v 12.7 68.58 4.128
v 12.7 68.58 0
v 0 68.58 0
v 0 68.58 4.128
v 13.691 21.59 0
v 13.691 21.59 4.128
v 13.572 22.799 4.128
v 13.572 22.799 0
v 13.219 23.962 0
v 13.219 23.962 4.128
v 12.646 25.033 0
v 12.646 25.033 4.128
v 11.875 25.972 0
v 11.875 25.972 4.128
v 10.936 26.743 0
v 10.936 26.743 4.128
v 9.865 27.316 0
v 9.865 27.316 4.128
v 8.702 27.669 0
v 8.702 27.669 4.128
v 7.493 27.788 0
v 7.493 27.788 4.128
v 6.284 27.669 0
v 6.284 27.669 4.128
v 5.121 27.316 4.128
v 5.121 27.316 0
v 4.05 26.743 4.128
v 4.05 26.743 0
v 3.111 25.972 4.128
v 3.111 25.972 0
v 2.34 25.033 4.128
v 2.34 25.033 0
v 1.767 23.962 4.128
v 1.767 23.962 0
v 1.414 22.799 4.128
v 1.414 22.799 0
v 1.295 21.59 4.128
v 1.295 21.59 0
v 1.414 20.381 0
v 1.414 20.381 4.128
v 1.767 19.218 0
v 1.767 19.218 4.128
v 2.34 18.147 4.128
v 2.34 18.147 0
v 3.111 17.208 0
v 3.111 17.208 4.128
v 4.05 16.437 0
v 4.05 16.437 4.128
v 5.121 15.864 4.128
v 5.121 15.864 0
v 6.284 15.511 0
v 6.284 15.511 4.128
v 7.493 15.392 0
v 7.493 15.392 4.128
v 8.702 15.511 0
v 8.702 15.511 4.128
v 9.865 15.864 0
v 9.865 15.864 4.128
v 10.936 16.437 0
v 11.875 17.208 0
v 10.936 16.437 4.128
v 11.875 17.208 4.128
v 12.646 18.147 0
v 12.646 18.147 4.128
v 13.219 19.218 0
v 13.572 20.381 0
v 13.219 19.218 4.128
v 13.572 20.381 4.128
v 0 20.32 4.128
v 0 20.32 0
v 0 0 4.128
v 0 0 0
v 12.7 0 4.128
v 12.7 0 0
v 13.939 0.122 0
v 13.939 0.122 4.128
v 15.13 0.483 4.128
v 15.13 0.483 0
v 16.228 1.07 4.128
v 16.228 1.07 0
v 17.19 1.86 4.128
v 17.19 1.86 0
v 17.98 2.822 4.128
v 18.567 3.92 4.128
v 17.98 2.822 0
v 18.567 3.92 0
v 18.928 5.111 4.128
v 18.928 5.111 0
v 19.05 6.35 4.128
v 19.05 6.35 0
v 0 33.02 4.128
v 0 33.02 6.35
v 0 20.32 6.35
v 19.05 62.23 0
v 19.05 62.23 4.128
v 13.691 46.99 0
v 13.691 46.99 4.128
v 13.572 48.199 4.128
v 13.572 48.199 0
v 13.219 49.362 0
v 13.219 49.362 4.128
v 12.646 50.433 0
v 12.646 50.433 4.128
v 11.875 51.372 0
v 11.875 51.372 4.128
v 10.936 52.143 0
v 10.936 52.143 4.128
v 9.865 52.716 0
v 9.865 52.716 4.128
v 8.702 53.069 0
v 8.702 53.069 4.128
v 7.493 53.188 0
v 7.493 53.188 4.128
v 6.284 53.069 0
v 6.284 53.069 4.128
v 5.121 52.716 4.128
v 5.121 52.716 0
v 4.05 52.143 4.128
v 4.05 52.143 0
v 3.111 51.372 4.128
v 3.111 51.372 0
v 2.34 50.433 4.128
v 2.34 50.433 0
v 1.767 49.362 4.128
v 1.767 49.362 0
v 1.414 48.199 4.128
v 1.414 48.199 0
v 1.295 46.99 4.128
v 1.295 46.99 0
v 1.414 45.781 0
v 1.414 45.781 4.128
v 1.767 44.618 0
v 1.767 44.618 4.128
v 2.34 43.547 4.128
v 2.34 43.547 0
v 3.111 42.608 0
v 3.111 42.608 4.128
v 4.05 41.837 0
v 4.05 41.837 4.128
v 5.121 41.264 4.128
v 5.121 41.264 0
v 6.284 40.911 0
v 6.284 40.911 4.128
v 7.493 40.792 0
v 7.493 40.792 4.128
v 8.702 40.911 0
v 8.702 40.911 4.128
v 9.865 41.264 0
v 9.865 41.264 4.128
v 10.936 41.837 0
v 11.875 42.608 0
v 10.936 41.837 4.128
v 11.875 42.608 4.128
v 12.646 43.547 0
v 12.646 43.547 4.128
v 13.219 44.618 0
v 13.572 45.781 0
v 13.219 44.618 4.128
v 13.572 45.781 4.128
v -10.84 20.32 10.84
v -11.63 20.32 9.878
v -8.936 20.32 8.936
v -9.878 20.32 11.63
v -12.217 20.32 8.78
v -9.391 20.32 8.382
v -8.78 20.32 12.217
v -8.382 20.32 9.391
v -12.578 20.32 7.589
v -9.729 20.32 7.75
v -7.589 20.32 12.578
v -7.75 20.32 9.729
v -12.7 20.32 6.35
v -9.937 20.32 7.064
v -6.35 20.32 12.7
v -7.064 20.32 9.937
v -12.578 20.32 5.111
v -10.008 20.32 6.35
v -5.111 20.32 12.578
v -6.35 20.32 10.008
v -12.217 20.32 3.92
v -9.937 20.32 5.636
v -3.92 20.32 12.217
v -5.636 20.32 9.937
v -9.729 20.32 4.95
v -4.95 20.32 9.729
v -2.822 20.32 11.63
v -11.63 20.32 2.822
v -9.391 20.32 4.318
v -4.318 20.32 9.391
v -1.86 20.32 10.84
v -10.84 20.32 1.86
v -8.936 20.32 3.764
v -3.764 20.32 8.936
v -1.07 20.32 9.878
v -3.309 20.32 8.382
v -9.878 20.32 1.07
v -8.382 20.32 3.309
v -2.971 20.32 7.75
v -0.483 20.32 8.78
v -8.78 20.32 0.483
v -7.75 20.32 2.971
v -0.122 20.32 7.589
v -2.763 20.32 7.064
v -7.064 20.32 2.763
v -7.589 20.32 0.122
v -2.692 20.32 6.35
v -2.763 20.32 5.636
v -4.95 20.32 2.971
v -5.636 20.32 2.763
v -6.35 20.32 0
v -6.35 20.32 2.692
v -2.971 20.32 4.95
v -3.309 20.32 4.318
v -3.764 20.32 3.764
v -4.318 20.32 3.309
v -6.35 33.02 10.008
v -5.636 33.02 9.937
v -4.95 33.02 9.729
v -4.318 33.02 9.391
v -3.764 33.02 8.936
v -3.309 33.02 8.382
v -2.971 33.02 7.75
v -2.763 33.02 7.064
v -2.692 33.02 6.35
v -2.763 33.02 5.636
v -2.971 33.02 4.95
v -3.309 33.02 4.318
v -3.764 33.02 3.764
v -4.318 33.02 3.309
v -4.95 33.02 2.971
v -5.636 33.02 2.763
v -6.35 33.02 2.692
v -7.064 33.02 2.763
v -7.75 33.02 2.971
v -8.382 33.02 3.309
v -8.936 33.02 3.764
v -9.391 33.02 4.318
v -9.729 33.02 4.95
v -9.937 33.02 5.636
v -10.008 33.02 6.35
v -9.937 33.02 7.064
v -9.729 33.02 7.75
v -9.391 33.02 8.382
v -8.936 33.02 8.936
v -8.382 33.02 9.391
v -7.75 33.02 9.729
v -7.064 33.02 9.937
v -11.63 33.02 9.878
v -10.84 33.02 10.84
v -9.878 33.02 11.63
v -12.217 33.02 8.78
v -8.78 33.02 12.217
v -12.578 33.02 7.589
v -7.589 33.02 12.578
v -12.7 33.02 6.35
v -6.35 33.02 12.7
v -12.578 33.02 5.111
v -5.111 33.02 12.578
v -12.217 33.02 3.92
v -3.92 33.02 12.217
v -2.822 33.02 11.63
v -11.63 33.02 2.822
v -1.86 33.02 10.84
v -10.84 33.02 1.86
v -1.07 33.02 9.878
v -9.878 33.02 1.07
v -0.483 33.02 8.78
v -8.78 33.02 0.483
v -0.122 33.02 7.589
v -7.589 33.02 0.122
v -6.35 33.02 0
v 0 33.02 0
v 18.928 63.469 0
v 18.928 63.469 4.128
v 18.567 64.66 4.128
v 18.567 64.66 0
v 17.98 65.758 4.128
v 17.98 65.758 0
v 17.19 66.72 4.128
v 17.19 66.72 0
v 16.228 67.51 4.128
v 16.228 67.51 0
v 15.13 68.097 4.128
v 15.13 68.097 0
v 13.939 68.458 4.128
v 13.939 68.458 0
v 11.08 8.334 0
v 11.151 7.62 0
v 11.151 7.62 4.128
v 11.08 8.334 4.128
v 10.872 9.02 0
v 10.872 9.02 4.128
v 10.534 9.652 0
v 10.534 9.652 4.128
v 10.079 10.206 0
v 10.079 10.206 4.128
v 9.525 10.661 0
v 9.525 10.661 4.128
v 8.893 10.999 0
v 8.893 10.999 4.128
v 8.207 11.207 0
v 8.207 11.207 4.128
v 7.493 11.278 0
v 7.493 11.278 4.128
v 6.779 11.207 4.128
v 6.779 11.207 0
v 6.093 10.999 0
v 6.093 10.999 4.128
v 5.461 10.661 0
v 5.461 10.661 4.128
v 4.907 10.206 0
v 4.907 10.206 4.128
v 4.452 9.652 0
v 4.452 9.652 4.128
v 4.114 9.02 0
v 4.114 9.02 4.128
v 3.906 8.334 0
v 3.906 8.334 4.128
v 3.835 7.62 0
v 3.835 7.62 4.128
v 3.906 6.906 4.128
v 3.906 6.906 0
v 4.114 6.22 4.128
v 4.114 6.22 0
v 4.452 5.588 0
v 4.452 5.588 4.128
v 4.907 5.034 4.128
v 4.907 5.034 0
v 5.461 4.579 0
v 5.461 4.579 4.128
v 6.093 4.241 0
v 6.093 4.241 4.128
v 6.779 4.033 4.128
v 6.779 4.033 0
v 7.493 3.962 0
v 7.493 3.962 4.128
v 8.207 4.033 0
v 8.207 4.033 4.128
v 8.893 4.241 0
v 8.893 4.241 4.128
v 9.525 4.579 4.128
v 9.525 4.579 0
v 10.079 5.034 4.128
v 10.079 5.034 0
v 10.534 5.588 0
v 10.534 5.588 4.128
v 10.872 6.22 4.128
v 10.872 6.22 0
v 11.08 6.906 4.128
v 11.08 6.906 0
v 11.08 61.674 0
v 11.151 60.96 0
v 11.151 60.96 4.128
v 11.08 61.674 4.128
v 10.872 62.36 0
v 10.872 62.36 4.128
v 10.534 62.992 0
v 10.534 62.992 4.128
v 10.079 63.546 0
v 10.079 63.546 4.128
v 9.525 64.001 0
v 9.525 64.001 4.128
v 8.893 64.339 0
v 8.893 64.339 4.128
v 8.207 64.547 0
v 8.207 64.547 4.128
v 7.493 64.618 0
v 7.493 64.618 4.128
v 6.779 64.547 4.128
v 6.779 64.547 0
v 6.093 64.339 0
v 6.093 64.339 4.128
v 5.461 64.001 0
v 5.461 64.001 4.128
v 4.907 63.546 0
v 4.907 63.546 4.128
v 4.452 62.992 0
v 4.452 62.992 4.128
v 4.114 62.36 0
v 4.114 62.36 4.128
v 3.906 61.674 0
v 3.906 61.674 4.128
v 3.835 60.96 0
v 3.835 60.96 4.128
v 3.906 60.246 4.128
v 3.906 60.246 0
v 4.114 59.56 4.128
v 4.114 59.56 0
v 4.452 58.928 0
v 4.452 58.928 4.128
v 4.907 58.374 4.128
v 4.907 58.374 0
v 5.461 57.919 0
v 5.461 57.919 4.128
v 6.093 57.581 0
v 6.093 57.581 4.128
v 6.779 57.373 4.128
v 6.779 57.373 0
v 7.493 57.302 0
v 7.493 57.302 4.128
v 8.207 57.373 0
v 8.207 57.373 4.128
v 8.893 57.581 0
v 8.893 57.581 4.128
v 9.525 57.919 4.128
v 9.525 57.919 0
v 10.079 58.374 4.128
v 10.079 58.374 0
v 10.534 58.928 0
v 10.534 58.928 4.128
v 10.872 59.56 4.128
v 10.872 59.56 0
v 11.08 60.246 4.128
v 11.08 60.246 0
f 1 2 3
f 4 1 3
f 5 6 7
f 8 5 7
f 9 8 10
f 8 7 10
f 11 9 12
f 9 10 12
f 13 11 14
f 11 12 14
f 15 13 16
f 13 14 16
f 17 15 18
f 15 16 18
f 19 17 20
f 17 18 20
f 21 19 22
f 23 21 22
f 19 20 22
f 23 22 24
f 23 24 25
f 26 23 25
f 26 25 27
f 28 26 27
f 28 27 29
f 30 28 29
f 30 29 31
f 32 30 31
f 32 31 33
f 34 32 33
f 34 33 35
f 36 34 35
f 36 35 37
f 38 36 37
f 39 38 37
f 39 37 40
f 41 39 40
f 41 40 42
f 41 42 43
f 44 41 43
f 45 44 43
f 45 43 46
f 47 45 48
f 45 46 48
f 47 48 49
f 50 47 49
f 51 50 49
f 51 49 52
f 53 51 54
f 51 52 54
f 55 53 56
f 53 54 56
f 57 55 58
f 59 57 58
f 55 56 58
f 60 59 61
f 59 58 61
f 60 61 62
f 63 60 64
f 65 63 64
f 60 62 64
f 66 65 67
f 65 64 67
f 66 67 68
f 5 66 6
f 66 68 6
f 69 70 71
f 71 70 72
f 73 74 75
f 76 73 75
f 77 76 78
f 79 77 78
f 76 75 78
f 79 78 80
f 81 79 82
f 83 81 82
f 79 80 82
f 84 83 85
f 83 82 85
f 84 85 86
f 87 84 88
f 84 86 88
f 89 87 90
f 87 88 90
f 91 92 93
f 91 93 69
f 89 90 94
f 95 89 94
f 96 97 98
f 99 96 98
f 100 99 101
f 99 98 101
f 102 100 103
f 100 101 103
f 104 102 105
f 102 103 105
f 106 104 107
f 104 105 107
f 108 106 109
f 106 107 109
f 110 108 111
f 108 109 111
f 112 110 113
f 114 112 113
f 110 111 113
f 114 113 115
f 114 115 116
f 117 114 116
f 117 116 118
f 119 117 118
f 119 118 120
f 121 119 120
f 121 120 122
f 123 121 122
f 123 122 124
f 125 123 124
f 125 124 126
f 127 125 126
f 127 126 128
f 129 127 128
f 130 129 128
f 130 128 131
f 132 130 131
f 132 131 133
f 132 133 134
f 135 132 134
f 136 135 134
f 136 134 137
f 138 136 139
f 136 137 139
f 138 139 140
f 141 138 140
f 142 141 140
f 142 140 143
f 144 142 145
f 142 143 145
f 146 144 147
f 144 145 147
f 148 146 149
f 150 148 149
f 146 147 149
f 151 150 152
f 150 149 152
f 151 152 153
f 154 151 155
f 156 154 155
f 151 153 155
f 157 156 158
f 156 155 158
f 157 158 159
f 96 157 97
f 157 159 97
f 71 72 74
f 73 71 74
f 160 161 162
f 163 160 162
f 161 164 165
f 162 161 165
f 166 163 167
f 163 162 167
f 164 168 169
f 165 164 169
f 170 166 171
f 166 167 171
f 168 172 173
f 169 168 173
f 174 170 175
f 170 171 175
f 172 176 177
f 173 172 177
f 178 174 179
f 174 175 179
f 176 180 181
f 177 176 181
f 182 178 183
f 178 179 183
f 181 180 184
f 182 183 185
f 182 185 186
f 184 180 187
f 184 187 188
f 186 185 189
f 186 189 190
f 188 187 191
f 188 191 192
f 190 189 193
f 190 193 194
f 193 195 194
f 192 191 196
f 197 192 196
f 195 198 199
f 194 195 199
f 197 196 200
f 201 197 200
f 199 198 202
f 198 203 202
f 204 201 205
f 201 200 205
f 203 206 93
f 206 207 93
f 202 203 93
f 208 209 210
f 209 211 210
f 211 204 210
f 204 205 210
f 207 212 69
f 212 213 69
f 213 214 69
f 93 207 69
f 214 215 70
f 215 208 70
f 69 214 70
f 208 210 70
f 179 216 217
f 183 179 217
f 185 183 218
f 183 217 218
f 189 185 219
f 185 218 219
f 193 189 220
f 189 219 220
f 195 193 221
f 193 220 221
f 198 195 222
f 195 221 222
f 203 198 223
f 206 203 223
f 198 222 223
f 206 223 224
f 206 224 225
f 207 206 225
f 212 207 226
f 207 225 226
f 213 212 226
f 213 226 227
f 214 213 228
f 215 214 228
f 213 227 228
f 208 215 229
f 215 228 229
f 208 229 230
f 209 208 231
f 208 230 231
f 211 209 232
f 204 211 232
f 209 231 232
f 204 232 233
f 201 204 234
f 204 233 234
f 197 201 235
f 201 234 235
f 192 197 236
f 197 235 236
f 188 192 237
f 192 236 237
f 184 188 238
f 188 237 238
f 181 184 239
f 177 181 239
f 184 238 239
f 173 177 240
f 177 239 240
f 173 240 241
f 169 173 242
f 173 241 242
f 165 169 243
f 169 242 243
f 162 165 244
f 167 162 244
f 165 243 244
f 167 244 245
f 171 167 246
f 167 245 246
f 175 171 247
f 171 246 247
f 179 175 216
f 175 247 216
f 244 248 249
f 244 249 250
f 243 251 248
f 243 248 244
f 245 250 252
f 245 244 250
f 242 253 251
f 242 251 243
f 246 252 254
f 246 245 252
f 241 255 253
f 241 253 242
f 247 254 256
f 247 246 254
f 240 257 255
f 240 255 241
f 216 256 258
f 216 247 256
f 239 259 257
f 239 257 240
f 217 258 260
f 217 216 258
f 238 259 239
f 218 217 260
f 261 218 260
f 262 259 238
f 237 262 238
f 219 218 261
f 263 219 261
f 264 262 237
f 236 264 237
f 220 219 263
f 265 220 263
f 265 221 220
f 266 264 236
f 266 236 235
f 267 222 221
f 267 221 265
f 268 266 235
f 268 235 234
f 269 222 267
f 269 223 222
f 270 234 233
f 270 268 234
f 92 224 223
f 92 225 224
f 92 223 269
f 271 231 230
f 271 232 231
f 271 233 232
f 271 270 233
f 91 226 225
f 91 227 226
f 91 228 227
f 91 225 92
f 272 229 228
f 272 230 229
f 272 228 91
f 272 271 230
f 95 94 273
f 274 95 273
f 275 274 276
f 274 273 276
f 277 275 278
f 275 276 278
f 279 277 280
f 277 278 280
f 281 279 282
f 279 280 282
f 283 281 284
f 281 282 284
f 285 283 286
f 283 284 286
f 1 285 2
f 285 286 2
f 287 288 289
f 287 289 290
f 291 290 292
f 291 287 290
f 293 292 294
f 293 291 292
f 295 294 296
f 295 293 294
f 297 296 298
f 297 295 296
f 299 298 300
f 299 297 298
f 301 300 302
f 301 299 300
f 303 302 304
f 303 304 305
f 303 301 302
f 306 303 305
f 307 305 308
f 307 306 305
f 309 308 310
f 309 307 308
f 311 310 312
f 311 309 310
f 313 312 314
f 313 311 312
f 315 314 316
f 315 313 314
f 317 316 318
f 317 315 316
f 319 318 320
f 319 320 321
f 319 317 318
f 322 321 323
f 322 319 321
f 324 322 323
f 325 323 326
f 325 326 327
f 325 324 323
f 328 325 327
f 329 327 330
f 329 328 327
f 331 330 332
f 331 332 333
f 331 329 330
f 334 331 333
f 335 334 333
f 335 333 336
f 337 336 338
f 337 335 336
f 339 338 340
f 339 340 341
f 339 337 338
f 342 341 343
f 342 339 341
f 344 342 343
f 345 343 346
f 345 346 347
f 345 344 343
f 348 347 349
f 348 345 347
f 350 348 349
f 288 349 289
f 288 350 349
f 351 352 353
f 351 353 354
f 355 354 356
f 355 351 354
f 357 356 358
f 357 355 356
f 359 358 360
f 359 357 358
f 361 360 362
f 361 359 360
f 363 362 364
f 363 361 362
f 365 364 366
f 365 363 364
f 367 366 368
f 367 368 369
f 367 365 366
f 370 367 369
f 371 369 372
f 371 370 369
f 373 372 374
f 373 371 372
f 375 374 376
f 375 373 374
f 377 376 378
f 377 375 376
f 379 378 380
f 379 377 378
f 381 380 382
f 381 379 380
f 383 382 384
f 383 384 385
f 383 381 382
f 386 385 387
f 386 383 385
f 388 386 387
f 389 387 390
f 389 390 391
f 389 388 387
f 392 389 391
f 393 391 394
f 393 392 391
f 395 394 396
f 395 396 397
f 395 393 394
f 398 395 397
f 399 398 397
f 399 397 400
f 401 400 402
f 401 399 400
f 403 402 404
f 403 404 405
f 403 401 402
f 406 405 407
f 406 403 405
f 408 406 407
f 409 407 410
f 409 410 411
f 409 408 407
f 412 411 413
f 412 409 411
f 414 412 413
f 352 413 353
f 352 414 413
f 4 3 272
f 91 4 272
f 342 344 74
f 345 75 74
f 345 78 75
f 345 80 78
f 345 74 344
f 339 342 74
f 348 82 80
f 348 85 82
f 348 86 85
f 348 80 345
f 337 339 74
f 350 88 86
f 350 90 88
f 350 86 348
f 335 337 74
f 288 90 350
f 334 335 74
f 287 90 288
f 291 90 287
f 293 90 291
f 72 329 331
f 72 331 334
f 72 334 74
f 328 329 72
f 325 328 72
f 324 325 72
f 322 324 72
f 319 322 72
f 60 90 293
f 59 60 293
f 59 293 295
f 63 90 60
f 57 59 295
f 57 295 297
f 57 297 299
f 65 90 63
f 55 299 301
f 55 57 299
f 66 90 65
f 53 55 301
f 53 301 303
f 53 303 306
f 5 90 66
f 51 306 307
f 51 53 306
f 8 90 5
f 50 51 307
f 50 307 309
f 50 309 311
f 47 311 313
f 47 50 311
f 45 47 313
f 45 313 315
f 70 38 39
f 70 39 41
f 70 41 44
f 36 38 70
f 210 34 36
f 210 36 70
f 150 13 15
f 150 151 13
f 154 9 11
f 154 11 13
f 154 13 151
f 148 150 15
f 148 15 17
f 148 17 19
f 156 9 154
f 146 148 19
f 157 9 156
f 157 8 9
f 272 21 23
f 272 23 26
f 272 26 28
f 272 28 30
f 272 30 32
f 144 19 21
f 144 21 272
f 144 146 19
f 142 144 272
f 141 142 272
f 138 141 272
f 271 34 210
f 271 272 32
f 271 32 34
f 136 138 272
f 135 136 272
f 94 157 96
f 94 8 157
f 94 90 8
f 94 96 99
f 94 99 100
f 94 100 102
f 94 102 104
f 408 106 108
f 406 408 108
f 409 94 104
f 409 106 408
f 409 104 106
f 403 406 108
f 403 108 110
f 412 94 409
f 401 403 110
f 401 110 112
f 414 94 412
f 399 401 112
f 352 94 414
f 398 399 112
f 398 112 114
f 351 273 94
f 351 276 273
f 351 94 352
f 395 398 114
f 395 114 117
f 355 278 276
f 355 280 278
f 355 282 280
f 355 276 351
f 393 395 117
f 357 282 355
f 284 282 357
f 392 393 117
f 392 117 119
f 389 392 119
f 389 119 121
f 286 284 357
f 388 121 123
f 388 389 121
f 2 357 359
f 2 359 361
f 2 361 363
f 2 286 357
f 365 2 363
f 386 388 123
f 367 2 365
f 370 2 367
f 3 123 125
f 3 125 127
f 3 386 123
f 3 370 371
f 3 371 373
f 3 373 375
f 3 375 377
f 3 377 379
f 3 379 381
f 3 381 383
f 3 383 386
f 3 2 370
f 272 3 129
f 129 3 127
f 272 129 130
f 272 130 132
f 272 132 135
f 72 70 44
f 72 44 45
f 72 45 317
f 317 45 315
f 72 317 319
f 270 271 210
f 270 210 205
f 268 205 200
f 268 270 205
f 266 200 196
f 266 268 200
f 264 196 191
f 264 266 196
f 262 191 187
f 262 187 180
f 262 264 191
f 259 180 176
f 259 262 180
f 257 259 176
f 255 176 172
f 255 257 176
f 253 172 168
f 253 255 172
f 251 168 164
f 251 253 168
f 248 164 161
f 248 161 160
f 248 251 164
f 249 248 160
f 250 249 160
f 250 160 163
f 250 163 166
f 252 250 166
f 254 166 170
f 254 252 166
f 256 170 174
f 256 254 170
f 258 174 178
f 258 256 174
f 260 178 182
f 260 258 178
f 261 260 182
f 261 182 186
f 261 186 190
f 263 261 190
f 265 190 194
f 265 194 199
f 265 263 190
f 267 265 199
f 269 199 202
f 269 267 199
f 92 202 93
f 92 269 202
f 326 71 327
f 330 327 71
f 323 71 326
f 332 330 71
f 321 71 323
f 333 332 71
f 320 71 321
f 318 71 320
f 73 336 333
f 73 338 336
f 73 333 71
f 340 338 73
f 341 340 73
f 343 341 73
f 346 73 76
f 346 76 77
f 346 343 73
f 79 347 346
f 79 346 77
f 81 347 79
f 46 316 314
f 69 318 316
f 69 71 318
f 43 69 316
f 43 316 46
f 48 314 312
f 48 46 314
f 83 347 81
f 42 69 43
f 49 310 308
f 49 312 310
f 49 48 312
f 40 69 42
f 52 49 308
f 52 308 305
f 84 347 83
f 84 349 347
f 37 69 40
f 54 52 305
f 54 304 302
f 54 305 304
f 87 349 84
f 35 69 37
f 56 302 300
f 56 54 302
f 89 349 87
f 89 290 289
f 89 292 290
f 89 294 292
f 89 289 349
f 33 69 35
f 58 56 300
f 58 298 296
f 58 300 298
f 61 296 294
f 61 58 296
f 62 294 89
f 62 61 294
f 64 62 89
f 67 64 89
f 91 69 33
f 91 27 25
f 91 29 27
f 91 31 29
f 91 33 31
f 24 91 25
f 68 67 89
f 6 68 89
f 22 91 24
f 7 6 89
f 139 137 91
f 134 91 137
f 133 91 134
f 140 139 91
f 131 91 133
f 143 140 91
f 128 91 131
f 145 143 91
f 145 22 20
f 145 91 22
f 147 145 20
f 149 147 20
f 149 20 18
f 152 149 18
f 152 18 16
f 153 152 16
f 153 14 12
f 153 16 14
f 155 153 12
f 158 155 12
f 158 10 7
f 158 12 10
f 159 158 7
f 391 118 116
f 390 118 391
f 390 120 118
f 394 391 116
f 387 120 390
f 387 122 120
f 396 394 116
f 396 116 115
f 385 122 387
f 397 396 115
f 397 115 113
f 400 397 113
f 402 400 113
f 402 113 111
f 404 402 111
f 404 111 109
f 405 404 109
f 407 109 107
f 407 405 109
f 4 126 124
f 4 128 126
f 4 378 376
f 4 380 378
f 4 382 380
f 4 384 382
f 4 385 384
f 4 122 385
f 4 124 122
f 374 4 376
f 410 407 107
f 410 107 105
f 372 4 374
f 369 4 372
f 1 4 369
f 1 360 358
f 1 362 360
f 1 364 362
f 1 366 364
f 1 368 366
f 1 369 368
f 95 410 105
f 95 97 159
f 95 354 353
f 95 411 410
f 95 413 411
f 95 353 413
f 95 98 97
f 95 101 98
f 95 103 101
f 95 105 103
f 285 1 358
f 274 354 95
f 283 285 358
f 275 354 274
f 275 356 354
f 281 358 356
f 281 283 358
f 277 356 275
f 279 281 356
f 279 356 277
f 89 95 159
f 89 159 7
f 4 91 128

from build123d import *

# Parameters (mm, degrees)
SKETCH1_R           = 3.6576
BOSS_EXTRUDE1_DEPTH = 4.1275
BOSS_EXTRUDE2_START = -35.56
SKETCH2_R           = 3.6576
BOSS_EXTRUDE2_DEPTH = 12.7
SKETCH3_R           = 6.1976
CUT_EXTRUDE1_DEPTH  = 72.691050043


with BuildPart() as part:
    # Sketch1 → Boss-Extrude1 (new body)
    with BuildSketch(Plane.XY):
        with BuildLine():
            Line((0, 0), (12.7, 0))
            ThreePointArc((12.7, 0), (17.190128061, 1.859871939), (19.05, 6.35))
            Line((19.05, 6.35), (19.05, 62.23))
            ThreePointArc((19.05, 62.23), (17.190128061, 66.720128061), (12.7, 68.58))
            Line((12.7, 68.58), (0, 68.58))
            Line((0, 68.58), (0, 0))
        make_face()
        with Locations((7.493, 60.96)):
            Circle(SKETCH1_R, mode=Mode.SUBTRACT)
        with Locations((7.493, 7.62)):
            Circle(SKETCH1_R, mode=Mode.SUBTRACT)
    extrude(amount=BOSS_EXTRUDE1_DEPTH)

    # Sketch2 → Boss-Extrude2 (add)
    with BuildSketch(Plane(origin=(0, 68.58, 0), x_dir=(1, 0, 0), z_dir=(0, 1, 0)).offset(BOSS_EXTRUDE2_START)):
        with BuildLine():
            Line((0, 0), (-6.35, 0))
            ThreePointArc((-6.35, 0), (-10.840128061, -10.840128061), (0, -6.35))
            Line((0, -6.35), (0, -4.1275))
            Line((0, -4.1275), (0, 0))
        make_face()
        with Locations(Location((-6.35, -6.35, 0), (0, 0, 270))):
            Circle(SKETCH2_R, mode=Mode.SUBTRACT)
    extrude(amount=-BOSS_EXTRUDE2_DEPTH)

    # Sketch3 → Cut-Extrude1 (cut, through all)
    with BuildSketch(Plane.XY.offset(4.1275)):
        with Locations((7.493, 46.99)):
            Circle(SKETCH3_R)
        with Locations((7.493, 21.59)):
            Circle(SKETCH3_R)
    extrude(amount=-CUT_EXTRUDE1_DEPTH, mode=Mode.SUBTRACT)


solid = part.part
